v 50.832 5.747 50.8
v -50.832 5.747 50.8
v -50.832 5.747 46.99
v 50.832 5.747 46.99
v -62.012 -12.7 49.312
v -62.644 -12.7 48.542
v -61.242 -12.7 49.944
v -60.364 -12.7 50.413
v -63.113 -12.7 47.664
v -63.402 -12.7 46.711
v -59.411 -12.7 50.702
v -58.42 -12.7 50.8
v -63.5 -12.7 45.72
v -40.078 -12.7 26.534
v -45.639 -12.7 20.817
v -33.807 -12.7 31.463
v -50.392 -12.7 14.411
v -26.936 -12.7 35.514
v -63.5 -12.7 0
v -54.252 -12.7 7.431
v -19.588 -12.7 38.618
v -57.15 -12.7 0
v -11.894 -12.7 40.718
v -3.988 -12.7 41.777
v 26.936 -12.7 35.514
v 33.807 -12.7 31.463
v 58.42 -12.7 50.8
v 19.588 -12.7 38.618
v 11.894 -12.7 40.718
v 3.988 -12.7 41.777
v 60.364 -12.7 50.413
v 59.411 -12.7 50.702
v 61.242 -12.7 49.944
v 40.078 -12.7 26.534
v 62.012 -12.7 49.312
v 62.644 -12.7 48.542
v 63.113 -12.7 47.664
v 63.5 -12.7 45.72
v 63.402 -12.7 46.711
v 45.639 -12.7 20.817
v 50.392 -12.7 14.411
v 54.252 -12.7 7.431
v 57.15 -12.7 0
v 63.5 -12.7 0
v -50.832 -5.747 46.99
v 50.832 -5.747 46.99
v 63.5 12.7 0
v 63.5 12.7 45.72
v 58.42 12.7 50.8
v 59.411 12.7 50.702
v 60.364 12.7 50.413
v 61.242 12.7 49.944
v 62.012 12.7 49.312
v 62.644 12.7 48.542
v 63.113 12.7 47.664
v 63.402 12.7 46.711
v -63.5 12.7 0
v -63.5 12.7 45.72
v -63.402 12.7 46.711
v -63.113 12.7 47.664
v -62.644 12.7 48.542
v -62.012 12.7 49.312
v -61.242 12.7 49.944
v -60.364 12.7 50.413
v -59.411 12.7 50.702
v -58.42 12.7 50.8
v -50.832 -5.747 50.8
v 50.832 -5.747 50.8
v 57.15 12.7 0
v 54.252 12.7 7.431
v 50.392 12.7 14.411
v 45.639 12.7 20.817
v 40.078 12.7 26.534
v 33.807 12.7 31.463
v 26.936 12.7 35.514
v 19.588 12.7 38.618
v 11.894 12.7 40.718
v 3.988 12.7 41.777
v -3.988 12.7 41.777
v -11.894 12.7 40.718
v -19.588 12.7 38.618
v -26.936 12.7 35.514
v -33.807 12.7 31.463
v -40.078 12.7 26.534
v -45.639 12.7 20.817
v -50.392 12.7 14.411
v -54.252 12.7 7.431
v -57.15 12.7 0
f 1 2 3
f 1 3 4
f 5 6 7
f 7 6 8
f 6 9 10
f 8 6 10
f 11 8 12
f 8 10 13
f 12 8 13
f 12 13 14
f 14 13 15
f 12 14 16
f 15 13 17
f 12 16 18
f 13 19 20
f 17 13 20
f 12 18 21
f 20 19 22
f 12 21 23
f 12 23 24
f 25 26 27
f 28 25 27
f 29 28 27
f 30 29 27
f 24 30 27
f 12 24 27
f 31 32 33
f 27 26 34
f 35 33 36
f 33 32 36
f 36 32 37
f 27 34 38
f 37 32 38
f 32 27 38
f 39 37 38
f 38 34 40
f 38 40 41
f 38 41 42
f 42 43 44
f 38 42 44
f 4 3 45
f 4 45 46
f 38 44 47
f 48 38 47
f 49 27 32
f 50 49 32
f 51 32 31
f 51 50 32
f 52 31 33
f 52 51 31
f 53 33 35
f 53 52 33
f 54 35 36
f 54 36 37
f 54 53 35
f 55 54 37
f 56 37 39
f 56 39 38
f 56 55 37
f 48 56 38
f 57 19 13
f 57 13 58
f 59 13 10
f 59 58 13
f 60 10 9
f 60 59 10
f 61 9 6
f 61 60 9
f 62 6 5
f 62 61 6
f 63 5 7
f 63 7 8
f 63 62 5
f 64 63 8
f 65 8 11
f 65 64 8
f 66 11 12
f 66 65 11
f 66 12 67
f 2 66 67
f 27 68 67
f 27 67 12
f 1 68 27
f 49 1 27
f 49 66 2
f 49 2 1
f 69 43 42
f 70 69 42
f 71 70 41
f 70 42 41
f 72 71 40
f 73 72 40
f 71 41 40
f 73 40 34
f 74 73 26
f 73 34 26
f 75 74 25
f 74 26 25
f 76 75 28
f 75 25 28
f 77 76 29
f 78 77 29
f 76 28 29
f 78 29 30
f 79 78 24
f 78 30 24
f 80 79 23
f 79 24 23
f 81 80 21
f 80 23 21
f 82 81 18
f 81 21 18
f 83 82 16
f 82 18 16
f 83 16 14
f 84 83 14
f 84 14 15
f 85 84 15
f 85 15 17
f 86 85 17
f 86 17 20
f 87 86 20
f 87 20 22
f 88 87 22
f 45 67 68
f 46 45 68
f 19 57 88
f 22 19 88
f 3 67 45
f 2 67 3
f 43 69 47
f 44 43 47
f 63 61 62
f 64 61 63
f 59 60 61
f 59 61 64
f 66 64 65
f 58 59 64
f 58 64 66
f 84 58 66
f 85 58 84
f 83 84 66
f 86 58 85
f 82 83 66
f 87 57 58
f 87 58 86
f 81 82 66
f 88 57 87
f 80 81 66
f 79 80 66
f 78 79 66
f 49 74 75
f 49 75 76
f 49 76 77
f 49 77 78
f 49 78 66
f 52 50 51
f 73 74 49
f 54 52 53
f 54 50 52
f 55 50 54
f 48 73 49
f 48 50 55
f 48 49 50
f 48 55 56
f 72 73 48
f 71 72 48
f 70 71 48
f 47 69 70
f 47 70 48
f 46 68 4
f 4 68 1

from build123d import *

# Parameters (mm, degrees)
F0_W     = 127
F0_H     = 25.4
F1_DEPTH = 50.8
F2_W     = 101.6635
F2_H     = 11.4935
F3_DEPTH = 3.81
F5_DEPTH = 50.8
F6_R     = 5.08


with BuildPart() as f1:
    # F0 (on Top) → F1 (new body)
    with BuildSketch(Plane.XY):
        Rectangle(F0_W, F0_H)
    extrude(amount=F1_DEPTH)

    # F2 (on face) → F3 (cut)
    with BuildSketch(Plane.XY.offset(50.8)):
        Rectangle(F2_W, F2_H)
    extrude(amount=-F3_DEPTH, mode=Mode.SUBTRACT)

    # F4 (on face) → F5 (cut)
    with BuildSketch(Plane.XZ.offset(12.7)):
        with BuildLine():
            Line((-57.15, 0), (57.15, 0))
            ThreePointArc((57.15, 0), (0, 41.91), (-57.15, 0))
        make_face()
    extrude(amount=-F5_DEPTH, mode=Mode.SUBTRACT)

    # F6
    f6_edges = [f1.edges().sort_by_distance(p)[0] for p in [
        (-63.5, 0, 50.8),
        (63.5, 0, 50.8),
    ]]
    fillet(f6_edges, radius=F6_R)


solid = f1.part
